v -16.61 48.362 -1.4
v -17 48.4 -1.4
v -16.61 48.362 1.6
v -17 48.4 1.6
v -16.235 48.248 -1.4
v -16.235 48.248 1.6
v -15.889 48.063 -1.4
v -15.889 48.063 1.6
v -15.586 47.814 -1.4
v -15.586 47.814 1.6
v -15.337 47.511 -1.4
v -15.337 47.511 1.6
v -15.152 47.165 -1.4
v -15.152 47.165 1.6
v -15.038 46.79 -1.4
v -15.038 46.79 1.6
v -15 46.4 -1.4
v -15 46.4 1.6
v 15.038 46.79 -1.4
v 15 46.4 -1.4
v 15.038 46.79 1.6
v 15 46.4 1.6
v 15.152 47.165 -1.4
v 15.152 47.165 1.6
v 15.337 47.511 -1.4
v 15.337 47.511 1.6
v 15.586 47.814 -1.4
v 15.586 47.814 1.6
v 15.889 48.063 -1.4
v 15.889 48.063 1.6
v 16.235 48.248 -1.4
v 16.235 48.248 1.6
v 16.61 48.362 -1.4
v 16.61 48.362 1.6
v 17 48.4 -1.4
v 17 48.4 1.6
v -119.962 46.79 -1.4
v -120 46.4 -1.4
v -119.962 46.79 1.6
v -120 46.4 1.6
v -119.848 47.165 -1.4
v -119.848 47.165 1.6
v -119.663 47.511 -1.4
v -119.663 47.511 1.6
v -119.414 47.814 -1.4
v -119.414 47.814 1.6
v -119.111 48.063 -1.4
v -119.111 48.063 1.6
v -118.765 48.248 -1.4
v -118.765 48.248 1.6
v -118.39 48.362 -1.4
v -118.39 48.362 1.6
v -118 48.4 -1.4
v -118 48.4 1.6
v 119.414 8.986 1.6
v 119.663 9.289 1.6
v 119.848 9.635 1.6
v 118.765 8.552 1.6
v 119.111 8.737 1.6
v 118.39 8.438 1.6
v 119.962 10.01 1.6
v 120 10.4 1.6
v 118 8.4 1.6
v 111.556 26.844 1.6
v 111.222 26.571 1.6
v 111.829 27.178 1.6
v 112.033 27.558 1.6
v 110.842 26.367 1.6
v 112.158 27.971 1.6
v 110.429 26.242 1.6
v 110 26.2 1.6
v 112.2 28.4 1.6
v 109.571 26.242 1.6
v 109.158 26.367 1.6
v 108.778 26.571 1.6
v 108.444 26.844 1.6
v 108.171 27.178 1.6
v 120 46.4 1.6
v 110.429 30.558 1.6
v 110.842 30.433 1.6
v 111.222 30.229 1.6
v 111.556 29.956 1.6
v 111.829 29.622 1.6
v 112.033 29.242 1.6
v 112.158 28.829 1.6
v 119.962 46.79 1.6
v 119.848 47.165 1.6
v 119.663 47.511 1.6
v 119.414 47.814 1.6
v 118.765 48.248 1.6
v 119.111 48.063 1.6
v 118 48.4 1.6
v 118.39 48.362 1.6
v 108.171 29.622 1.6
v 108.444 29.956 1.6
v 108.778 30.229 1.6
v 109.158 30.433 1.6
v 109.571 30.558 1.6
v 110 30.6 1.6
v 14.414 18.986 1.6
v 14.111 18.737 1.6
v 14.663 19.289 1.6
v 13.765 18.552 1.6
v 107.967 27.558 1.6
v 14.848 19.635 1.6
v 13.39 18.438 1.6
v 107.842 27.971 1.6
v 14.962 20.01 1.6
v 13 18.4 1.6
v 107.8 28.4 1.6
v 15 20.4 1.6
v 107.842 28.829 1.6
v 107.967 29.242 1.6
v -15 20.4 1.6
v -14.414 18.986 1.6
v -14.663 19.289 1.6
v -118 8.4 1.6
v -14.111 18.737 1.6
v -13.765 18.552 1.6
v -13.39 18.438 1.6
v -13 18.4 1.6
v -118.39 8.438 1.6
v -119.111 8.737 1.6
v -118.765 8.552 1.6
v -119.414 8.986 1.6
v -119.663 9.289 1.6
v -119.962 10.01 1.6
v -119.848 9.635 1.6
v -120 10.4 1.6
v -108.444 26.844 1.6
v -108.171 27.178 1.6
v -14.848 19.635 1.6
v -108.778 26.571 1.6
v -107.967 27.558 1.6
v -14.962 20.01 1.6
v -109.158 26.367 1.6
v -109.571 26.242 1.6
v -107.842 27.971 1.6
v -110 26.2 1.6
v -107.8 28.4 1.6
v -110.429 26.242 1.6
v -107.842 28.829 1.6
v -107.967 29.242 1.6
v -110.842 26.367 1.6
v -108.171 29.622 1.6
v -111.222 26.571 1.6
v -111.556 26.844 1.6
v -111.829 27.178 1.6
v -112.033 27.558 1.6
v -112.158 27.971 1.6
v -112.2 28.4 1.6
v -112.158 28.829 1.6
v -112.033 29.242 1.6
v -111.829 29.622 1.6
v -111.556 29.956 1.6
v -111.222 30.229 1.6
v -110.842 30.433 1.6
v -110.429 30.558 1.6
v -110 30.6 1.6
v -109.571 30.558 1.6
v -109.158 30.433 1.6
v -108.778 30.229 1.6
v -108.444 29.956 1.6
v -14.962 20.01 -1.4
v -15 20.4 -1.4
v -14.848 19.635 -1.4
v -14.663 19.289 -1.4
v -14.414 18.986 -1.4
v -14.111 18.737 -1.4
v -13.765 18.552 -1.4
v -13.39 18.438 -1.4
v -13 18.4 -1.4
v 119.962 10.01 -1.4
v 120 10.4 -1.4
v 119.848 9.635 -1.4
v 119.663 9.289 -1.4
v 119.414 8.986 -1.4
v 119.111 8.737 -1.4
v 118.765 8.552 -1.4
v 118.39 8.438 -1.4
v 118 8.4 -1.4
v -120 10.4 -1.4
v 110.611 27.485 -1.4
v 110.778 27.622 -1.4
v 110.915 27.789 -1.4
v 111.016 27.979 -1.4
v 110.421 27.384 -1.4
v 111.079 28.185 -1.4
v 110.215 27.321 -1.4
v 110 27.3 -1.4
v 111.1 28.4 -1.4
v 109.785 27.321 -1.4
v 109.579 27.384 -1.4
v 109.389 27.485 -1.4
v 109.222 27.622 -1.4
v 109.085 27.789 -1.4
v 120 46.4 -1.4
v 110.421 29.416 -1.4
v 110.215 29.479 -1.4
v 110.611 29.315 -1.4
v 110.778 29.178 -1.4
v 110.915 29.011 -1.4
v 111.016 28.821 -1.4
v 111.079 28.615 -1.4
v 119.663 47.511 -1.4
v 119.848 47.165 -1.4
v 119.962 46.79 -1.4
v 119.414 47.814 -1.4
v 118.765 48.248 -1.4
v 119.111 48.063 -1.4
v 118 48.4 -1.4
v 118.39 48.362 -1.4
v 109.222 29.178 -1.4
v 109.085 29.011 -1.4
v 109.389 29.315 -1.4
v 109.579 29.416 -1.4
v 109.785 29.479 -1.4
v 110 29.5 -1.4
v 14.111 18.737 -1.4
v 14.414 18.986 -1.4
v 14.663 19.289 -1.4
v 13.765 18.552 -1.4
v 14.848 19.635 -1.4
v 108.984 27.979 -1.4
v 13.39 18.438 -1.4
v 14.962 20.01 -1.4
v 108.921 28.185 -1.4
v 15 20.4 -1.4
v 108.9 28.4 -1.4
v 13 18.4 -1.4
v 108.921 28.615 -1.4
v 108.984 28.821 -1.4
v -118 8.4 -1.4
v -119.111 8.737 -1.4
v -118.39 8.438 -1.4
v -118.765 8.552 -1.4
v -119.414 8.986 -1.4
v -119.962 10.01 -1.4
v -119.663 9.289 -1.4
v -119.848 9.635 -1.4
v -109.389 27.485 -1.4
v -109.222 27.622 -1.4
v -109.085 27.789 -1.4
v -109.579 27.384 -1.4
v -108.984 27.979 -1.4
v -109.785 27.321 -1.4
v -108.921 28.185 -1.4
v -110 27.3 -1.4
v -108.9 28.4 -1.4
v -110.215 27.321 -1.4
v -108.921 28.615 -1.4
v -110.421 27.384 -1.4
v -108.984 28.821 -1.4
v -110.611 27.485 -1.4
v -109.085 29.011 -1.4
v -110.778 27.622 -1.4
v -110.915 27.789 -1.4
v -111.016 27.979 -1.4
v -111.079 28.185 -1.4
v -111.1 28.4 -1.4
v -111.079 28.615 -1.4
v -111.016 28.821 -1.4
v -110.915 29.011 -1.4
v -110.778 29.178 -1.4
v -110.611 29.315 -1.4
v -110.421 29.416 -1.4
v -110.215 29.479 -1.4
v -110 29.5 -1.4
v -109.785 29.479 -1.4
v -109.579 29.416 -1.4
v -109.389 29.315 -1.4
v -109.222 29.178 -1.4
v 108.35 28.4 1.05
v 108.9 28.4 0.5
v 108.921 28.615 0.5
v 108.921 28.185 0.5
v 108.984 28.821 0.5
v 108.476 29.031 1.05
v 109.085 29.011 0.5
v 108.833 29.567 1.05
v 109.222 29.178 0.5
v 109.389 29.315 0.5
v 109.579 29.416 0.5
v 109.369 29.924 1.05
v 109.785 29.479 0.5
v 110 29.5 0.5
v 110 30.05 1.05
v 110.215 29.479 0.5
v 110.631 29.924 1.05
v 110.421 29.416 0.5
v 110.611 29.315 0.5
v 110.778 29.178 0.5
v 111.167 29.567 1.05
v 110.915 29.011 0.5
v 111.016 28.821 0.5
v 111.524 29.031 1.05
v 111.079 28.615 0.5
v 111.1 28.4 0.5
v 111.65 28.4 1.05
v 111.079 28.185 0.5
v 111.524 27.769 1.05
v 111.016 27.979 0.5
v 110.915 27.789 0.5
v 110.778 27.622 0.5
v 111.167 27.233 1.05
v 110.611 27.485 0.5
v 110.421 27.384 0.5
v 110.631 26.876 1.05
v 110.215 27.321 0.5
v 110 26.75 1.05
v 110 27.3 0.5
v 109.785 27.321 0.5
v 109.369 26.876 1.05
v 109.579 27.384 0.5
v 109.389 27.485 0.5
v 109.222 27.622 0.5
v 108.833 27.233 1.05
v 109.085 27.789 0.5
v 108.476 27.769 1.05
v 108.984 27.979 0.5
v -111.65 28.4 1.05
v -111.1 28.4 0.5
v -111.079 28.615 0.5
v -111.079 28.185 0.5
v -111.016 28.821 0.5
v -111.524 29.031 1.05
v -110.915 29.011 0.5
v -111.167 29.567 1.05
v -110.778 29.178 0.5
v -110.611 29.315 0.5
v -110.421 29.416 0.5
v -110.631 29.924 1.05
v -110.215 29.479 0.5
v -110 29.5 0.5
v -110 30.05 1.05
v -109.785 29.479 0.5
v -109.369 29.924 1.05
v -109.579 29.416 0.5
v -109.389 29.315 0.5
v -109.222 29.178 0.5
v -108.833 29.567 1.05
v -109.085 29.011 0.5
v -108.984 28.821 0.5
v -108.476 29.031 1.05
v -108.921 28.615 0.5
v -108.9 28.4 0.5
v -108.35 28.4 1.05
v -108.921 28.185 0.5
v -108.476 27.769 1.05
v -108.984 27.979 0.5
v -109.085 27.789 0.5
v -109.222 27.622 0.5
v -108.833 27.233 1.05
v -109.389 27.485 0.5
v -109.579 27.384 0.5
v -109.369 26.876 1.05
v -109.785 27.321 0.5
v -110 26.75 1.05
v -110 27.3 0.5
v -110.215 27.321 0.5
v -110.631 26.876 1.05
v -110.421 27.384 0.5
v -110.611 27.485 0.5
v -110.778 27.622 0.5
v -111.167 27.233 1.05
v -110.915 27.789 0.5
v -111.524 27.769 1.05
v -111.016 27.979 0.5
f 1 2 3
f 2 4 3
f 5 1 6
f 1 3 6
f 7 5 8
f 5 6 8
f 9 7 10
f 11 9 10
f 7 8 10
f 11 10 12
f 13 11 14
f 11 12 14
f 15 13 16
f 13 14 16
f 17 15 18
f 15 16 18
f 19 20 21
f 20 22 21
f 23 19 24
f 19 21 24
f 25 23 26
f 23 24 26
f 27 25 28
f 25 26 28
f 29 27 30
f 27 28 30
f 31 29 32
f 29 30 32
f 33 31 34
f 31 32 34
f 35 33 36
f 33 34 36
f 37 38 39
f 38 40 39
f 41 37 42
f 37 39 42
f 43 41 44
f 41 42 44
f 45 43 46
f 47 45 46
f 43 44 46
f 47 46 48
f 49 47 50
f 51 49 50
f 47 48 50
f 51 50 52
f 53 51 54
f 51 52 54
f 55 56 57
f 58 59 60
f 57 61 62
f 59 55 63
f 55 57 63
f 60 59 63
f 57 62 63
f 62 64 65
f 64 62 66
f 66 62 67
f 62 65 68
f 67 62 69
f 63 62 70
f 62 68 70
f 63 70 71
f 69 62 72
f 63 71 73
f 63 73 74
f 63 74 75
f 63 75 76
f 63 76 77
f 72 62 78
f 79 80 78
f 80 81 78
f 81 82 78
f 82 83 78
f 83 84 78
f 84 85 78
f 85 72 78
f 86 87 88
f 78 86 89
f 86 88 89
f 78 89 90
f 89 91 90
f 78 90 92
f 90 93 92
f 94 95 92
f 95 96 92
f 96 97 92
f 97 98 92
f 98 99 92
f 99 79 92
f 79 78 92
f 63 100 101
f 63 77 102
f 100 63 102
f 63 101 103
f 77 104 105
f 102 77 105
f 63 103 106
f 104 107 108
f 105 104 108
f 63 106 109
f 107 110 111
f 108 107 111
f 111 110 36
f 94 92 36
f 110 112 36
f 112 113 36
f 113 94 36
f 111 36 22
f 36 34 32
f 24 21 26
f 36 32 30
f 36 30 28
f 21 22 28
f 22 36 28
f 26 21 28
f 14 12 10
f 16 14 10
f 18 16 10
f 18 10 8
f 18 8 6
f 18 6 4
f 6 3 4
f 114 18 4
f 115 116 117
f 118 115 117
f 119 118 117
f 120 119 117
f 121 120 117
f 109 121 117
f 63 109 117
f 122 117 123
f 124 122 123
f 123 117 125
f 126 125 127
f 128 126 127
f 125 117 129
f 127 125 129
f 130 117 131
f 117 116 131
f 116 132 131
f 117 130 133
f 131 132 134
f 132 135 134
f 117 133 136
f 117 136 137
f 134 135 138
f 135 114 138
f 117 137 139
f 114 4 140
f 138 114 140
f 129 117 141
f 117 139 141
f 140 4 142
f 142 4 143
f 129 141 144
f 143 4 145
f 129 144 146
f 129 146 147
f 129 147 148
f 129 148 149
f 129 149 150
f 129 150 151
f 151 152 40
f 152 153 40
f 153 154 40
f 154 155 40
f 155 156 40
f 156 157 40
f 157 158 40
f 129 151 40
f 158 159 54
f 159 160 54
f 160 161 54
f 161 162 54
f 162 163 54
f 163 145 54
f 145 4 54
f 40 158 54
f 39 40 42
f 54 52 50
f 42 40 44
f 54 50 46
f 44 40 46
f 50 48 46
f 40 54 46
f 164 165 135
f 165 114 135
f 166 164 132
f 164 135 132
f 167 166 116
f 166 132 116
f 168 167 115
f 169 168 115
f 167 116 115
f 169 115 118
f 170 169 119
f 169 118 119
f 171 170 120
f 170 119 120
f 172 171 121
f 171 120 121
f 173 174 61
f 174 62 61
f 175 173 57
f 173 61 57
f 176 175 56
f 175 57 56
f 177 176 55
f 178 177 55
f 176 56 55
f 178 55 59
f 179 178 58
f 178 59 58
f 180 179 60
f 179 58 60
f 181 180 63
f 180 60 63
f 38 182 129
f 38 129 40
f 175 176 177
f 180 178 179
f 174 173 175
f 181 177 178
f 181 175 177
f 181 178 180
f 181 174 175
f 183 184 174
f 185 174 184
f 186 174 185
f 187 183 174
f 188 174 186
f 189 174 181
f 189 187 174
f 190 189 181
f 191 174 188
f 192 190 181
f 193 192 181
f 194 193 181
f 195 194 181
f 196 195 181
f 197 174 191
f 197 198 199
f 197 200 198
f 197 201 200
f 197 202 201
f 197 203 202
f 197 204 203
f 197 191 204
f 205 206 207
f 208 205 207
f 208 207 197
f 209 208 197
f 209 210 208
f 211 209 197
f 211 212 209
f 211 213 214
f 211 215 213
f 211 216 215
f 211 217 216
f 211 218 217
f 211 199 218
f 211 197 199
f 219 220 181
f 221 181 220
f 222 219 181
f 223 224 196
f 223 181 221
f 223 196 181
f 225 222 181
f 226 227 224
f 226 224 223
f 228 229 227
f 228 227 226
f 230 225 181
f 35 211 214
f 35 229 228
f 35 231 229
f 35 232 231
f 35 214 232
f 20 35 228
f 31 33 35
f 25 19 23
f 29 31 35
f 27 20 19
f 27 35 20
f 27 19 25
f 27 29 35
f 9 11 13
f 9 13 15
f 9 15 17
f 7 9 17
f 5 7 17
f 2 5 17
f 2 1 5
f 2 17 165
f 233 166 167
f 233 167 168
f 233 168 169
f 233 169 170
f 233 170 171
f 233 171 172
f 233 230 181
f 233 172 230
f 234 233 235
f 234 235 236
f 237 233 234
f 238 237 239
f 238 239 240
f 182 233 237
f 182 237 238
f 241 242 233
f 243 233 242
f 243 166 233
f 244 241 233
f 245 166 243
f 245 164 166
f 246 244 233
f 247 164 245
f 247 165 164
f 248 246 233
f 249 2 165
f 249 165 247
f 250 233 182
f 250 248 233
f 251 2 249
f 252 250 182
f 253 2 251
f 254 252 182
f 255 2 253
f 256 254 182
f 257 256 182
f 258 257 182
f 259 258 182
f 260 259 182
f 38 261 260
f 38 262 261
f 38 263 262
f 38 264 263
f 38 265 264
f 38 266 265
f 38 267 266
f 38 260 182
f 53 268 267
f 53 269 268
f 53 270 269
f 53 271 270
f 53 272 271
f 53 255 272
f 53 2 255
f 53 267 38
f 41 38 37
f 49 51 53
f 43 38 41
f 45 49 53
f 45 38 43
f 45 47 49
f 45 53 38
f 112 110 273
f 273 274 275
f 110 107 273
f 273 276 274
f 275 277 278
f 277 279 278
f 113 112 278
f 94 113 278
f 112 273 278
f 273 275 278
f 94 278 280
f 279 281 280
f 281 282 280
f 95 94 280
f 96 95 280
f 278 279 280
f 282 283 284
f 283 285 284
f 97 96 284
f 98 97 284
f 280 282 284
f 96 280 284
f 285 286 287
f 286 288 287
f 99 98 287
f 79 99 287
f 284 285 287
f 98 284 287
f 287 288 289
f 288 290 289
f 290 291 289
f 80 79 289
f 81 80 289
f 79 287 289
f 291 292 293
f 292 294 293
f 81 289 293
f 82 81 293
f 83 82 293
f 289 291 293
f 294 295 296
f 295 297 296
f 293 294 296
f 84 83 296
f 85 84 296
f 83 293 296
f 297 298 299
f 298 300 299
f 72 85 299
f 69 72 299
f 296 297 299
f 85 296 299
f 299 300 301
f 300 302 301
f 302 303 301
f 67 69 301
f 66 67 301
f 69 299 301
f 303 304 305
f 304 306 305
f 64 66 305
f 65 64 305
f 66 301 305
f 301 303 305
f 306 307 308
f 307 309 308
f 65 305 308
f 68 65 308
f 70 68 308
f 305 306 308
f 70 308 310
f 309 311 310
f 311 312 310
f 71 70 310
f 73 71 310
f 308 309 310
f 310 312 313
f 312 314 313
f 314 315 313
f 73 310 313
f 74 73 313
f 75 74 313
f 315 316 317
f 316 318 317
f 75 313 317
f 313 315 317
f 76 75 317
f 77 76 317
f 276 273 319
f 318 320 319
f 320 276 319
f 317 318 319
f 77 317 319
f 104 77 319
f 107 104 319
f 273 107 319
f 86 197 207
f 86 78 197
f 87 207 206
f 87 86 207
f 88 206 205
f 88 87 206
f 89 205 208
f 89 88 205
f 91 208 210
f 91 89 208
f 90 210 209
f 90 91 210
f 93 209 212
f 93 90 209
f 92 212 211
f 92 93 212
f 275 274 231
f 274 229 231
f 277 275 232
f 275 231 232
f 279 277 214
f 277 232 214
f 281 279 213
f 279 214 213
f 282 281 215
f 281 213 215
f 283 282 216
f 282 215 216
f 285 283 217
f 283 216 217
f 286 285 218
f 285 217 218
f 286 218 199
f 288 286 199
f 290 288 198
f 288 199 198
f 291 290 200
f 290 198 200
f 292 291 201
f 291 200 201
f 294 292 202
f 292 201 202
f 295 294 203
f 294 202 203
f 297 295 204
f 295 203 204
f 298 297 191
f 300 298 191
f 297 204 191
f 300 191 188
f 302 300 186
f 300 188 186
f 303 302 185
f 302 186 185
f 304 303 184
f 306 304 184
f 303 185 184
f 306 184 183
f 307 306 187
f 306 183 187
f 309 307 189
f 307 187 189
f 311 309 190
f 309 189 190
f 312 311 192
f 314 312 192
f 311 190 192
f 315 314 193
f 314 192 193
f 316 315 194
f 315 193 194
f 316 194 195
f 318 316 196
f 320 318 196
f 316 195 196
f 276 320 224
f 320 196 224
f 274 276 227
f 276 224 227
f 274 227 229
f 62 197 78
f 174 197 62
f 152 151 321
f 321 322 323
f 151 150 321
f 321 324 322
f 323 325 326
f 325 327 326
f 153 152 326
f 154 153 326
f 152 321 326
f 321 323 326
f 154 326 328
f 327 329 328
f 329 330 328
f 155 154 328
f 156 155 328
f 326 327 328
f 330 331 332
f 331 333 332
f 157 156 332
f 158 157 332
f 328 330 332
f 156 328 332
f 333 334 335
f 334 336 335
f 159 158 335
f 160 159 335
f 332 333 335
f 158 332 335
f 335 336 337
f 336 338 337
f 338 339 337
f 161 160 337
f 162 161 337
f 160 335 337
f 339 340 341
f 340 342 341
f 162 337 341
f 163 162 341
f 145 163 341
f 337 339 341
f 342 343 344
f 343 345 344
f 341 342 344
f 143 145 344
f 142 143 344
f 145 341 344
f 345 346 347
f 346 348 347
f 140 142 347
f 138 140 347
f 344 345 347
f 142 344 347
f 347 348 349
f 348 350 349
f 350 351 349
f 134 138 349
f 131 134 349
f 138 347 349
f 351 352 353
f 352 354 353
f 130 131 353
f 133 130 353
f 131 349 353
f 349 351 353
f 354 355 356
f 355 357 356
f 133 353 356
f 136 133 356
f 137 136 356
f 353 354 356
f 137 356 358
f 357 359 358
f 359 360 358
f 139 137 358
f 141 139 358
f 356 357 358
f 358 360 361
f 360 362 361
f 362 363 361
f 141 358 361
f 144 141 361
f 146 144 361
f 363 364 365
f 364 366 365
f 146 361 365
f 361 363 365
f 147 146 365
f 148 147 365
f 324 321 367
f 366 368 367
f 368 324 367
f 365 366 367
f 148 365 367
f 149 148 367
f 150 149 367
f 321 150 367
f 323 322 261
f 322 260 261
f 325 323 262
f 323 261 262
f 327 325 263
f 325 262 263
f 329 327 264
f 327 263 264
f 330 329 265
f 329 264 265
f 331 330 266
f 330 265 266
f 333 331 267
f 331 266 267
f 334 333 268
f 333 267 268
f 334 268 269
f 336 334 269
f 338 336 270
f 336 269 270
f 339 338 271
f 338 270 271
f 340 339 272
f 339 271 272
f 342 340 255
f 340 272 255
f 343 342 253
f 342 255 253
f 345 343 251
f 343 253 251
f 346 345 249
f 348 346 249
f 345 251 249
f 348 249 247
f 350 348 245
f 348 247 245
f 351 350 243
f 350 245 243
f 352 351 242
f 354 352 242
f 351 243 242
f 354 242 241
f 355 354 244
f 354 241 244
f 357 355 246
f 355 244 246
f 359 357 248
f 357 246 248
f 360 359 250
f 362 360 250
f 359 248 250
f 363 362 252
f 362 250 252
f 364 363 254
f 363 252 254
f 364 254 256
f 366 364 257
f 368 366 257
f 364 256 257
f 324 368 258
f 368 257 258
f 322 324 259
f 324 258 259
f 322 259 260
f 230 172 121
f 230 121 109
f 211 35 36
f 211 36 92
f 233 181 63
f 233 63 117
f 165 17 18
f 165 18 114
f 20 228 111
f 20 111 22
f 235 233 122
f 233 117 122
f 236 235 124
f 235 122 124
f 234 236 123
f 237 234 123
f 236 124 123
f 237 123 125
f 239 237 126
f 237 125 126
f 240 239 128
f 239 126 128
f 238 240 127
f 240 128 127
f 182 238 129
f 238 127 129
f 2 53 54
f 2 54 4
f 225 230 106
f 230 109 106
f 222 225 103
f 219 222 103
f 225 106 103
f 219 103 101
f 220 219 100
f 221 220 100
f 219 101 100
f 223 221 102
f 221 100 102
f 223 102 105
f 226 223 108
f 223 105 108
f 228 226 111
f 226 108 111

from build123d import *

# Parameters (mm, degrees)
PAD004_DEPTH        = 3
FILLET009_R         = 2
HOLE002_D           = 2.2
HOLE002_DEPTH       = 20
HOLE002_CSINK_D     = 4.4
HOLE002_CSINK_ANGLE = 90


with BuildPart() as part:
    # Sketch016 → Pad004 (new body)
    with BuildSketch(Plane.XY.offset(-1.4)):
        Polygon((120, 48.4), (120, 8.4), (-120, 8.4), (-120, 48.4), (-15, 48.4), (-15, 18.4), (15, 18.4), (15, 48.4), align=None)
    extrude(amount=PAD004_DEPTH)

    # Fillet009
    fillet009_edges = [part.edges().sort_by_distance(p)[0] for p in [
        (-120, 48.4, 0.1),
        (-120, 8.4, 0.1),
        (120, 8.4, 0.1),
        (120, 48.4, 0.1),
        (15, 48.4, 0.1),
        (-15, 48.4, 0.1),
        (-15, 18.4, 0.1),
        (15, 18.4, 0.1),
    ]]
    fillet(fillet009_edges, radius=FILLET009_R)

    # Hole002
    with Locations(Plane.XY.offset(1.6)):
        with Locations((-110, 28.4), (110, 28.4)):
            CounterSinkHole(HOLE002_D / 2, HOLE002_CSINK_D / 2, depth=HOLE002_DEPTH, counter_sink_angle=HOLE002_CSINK_ANGLE)


solid = part.part
